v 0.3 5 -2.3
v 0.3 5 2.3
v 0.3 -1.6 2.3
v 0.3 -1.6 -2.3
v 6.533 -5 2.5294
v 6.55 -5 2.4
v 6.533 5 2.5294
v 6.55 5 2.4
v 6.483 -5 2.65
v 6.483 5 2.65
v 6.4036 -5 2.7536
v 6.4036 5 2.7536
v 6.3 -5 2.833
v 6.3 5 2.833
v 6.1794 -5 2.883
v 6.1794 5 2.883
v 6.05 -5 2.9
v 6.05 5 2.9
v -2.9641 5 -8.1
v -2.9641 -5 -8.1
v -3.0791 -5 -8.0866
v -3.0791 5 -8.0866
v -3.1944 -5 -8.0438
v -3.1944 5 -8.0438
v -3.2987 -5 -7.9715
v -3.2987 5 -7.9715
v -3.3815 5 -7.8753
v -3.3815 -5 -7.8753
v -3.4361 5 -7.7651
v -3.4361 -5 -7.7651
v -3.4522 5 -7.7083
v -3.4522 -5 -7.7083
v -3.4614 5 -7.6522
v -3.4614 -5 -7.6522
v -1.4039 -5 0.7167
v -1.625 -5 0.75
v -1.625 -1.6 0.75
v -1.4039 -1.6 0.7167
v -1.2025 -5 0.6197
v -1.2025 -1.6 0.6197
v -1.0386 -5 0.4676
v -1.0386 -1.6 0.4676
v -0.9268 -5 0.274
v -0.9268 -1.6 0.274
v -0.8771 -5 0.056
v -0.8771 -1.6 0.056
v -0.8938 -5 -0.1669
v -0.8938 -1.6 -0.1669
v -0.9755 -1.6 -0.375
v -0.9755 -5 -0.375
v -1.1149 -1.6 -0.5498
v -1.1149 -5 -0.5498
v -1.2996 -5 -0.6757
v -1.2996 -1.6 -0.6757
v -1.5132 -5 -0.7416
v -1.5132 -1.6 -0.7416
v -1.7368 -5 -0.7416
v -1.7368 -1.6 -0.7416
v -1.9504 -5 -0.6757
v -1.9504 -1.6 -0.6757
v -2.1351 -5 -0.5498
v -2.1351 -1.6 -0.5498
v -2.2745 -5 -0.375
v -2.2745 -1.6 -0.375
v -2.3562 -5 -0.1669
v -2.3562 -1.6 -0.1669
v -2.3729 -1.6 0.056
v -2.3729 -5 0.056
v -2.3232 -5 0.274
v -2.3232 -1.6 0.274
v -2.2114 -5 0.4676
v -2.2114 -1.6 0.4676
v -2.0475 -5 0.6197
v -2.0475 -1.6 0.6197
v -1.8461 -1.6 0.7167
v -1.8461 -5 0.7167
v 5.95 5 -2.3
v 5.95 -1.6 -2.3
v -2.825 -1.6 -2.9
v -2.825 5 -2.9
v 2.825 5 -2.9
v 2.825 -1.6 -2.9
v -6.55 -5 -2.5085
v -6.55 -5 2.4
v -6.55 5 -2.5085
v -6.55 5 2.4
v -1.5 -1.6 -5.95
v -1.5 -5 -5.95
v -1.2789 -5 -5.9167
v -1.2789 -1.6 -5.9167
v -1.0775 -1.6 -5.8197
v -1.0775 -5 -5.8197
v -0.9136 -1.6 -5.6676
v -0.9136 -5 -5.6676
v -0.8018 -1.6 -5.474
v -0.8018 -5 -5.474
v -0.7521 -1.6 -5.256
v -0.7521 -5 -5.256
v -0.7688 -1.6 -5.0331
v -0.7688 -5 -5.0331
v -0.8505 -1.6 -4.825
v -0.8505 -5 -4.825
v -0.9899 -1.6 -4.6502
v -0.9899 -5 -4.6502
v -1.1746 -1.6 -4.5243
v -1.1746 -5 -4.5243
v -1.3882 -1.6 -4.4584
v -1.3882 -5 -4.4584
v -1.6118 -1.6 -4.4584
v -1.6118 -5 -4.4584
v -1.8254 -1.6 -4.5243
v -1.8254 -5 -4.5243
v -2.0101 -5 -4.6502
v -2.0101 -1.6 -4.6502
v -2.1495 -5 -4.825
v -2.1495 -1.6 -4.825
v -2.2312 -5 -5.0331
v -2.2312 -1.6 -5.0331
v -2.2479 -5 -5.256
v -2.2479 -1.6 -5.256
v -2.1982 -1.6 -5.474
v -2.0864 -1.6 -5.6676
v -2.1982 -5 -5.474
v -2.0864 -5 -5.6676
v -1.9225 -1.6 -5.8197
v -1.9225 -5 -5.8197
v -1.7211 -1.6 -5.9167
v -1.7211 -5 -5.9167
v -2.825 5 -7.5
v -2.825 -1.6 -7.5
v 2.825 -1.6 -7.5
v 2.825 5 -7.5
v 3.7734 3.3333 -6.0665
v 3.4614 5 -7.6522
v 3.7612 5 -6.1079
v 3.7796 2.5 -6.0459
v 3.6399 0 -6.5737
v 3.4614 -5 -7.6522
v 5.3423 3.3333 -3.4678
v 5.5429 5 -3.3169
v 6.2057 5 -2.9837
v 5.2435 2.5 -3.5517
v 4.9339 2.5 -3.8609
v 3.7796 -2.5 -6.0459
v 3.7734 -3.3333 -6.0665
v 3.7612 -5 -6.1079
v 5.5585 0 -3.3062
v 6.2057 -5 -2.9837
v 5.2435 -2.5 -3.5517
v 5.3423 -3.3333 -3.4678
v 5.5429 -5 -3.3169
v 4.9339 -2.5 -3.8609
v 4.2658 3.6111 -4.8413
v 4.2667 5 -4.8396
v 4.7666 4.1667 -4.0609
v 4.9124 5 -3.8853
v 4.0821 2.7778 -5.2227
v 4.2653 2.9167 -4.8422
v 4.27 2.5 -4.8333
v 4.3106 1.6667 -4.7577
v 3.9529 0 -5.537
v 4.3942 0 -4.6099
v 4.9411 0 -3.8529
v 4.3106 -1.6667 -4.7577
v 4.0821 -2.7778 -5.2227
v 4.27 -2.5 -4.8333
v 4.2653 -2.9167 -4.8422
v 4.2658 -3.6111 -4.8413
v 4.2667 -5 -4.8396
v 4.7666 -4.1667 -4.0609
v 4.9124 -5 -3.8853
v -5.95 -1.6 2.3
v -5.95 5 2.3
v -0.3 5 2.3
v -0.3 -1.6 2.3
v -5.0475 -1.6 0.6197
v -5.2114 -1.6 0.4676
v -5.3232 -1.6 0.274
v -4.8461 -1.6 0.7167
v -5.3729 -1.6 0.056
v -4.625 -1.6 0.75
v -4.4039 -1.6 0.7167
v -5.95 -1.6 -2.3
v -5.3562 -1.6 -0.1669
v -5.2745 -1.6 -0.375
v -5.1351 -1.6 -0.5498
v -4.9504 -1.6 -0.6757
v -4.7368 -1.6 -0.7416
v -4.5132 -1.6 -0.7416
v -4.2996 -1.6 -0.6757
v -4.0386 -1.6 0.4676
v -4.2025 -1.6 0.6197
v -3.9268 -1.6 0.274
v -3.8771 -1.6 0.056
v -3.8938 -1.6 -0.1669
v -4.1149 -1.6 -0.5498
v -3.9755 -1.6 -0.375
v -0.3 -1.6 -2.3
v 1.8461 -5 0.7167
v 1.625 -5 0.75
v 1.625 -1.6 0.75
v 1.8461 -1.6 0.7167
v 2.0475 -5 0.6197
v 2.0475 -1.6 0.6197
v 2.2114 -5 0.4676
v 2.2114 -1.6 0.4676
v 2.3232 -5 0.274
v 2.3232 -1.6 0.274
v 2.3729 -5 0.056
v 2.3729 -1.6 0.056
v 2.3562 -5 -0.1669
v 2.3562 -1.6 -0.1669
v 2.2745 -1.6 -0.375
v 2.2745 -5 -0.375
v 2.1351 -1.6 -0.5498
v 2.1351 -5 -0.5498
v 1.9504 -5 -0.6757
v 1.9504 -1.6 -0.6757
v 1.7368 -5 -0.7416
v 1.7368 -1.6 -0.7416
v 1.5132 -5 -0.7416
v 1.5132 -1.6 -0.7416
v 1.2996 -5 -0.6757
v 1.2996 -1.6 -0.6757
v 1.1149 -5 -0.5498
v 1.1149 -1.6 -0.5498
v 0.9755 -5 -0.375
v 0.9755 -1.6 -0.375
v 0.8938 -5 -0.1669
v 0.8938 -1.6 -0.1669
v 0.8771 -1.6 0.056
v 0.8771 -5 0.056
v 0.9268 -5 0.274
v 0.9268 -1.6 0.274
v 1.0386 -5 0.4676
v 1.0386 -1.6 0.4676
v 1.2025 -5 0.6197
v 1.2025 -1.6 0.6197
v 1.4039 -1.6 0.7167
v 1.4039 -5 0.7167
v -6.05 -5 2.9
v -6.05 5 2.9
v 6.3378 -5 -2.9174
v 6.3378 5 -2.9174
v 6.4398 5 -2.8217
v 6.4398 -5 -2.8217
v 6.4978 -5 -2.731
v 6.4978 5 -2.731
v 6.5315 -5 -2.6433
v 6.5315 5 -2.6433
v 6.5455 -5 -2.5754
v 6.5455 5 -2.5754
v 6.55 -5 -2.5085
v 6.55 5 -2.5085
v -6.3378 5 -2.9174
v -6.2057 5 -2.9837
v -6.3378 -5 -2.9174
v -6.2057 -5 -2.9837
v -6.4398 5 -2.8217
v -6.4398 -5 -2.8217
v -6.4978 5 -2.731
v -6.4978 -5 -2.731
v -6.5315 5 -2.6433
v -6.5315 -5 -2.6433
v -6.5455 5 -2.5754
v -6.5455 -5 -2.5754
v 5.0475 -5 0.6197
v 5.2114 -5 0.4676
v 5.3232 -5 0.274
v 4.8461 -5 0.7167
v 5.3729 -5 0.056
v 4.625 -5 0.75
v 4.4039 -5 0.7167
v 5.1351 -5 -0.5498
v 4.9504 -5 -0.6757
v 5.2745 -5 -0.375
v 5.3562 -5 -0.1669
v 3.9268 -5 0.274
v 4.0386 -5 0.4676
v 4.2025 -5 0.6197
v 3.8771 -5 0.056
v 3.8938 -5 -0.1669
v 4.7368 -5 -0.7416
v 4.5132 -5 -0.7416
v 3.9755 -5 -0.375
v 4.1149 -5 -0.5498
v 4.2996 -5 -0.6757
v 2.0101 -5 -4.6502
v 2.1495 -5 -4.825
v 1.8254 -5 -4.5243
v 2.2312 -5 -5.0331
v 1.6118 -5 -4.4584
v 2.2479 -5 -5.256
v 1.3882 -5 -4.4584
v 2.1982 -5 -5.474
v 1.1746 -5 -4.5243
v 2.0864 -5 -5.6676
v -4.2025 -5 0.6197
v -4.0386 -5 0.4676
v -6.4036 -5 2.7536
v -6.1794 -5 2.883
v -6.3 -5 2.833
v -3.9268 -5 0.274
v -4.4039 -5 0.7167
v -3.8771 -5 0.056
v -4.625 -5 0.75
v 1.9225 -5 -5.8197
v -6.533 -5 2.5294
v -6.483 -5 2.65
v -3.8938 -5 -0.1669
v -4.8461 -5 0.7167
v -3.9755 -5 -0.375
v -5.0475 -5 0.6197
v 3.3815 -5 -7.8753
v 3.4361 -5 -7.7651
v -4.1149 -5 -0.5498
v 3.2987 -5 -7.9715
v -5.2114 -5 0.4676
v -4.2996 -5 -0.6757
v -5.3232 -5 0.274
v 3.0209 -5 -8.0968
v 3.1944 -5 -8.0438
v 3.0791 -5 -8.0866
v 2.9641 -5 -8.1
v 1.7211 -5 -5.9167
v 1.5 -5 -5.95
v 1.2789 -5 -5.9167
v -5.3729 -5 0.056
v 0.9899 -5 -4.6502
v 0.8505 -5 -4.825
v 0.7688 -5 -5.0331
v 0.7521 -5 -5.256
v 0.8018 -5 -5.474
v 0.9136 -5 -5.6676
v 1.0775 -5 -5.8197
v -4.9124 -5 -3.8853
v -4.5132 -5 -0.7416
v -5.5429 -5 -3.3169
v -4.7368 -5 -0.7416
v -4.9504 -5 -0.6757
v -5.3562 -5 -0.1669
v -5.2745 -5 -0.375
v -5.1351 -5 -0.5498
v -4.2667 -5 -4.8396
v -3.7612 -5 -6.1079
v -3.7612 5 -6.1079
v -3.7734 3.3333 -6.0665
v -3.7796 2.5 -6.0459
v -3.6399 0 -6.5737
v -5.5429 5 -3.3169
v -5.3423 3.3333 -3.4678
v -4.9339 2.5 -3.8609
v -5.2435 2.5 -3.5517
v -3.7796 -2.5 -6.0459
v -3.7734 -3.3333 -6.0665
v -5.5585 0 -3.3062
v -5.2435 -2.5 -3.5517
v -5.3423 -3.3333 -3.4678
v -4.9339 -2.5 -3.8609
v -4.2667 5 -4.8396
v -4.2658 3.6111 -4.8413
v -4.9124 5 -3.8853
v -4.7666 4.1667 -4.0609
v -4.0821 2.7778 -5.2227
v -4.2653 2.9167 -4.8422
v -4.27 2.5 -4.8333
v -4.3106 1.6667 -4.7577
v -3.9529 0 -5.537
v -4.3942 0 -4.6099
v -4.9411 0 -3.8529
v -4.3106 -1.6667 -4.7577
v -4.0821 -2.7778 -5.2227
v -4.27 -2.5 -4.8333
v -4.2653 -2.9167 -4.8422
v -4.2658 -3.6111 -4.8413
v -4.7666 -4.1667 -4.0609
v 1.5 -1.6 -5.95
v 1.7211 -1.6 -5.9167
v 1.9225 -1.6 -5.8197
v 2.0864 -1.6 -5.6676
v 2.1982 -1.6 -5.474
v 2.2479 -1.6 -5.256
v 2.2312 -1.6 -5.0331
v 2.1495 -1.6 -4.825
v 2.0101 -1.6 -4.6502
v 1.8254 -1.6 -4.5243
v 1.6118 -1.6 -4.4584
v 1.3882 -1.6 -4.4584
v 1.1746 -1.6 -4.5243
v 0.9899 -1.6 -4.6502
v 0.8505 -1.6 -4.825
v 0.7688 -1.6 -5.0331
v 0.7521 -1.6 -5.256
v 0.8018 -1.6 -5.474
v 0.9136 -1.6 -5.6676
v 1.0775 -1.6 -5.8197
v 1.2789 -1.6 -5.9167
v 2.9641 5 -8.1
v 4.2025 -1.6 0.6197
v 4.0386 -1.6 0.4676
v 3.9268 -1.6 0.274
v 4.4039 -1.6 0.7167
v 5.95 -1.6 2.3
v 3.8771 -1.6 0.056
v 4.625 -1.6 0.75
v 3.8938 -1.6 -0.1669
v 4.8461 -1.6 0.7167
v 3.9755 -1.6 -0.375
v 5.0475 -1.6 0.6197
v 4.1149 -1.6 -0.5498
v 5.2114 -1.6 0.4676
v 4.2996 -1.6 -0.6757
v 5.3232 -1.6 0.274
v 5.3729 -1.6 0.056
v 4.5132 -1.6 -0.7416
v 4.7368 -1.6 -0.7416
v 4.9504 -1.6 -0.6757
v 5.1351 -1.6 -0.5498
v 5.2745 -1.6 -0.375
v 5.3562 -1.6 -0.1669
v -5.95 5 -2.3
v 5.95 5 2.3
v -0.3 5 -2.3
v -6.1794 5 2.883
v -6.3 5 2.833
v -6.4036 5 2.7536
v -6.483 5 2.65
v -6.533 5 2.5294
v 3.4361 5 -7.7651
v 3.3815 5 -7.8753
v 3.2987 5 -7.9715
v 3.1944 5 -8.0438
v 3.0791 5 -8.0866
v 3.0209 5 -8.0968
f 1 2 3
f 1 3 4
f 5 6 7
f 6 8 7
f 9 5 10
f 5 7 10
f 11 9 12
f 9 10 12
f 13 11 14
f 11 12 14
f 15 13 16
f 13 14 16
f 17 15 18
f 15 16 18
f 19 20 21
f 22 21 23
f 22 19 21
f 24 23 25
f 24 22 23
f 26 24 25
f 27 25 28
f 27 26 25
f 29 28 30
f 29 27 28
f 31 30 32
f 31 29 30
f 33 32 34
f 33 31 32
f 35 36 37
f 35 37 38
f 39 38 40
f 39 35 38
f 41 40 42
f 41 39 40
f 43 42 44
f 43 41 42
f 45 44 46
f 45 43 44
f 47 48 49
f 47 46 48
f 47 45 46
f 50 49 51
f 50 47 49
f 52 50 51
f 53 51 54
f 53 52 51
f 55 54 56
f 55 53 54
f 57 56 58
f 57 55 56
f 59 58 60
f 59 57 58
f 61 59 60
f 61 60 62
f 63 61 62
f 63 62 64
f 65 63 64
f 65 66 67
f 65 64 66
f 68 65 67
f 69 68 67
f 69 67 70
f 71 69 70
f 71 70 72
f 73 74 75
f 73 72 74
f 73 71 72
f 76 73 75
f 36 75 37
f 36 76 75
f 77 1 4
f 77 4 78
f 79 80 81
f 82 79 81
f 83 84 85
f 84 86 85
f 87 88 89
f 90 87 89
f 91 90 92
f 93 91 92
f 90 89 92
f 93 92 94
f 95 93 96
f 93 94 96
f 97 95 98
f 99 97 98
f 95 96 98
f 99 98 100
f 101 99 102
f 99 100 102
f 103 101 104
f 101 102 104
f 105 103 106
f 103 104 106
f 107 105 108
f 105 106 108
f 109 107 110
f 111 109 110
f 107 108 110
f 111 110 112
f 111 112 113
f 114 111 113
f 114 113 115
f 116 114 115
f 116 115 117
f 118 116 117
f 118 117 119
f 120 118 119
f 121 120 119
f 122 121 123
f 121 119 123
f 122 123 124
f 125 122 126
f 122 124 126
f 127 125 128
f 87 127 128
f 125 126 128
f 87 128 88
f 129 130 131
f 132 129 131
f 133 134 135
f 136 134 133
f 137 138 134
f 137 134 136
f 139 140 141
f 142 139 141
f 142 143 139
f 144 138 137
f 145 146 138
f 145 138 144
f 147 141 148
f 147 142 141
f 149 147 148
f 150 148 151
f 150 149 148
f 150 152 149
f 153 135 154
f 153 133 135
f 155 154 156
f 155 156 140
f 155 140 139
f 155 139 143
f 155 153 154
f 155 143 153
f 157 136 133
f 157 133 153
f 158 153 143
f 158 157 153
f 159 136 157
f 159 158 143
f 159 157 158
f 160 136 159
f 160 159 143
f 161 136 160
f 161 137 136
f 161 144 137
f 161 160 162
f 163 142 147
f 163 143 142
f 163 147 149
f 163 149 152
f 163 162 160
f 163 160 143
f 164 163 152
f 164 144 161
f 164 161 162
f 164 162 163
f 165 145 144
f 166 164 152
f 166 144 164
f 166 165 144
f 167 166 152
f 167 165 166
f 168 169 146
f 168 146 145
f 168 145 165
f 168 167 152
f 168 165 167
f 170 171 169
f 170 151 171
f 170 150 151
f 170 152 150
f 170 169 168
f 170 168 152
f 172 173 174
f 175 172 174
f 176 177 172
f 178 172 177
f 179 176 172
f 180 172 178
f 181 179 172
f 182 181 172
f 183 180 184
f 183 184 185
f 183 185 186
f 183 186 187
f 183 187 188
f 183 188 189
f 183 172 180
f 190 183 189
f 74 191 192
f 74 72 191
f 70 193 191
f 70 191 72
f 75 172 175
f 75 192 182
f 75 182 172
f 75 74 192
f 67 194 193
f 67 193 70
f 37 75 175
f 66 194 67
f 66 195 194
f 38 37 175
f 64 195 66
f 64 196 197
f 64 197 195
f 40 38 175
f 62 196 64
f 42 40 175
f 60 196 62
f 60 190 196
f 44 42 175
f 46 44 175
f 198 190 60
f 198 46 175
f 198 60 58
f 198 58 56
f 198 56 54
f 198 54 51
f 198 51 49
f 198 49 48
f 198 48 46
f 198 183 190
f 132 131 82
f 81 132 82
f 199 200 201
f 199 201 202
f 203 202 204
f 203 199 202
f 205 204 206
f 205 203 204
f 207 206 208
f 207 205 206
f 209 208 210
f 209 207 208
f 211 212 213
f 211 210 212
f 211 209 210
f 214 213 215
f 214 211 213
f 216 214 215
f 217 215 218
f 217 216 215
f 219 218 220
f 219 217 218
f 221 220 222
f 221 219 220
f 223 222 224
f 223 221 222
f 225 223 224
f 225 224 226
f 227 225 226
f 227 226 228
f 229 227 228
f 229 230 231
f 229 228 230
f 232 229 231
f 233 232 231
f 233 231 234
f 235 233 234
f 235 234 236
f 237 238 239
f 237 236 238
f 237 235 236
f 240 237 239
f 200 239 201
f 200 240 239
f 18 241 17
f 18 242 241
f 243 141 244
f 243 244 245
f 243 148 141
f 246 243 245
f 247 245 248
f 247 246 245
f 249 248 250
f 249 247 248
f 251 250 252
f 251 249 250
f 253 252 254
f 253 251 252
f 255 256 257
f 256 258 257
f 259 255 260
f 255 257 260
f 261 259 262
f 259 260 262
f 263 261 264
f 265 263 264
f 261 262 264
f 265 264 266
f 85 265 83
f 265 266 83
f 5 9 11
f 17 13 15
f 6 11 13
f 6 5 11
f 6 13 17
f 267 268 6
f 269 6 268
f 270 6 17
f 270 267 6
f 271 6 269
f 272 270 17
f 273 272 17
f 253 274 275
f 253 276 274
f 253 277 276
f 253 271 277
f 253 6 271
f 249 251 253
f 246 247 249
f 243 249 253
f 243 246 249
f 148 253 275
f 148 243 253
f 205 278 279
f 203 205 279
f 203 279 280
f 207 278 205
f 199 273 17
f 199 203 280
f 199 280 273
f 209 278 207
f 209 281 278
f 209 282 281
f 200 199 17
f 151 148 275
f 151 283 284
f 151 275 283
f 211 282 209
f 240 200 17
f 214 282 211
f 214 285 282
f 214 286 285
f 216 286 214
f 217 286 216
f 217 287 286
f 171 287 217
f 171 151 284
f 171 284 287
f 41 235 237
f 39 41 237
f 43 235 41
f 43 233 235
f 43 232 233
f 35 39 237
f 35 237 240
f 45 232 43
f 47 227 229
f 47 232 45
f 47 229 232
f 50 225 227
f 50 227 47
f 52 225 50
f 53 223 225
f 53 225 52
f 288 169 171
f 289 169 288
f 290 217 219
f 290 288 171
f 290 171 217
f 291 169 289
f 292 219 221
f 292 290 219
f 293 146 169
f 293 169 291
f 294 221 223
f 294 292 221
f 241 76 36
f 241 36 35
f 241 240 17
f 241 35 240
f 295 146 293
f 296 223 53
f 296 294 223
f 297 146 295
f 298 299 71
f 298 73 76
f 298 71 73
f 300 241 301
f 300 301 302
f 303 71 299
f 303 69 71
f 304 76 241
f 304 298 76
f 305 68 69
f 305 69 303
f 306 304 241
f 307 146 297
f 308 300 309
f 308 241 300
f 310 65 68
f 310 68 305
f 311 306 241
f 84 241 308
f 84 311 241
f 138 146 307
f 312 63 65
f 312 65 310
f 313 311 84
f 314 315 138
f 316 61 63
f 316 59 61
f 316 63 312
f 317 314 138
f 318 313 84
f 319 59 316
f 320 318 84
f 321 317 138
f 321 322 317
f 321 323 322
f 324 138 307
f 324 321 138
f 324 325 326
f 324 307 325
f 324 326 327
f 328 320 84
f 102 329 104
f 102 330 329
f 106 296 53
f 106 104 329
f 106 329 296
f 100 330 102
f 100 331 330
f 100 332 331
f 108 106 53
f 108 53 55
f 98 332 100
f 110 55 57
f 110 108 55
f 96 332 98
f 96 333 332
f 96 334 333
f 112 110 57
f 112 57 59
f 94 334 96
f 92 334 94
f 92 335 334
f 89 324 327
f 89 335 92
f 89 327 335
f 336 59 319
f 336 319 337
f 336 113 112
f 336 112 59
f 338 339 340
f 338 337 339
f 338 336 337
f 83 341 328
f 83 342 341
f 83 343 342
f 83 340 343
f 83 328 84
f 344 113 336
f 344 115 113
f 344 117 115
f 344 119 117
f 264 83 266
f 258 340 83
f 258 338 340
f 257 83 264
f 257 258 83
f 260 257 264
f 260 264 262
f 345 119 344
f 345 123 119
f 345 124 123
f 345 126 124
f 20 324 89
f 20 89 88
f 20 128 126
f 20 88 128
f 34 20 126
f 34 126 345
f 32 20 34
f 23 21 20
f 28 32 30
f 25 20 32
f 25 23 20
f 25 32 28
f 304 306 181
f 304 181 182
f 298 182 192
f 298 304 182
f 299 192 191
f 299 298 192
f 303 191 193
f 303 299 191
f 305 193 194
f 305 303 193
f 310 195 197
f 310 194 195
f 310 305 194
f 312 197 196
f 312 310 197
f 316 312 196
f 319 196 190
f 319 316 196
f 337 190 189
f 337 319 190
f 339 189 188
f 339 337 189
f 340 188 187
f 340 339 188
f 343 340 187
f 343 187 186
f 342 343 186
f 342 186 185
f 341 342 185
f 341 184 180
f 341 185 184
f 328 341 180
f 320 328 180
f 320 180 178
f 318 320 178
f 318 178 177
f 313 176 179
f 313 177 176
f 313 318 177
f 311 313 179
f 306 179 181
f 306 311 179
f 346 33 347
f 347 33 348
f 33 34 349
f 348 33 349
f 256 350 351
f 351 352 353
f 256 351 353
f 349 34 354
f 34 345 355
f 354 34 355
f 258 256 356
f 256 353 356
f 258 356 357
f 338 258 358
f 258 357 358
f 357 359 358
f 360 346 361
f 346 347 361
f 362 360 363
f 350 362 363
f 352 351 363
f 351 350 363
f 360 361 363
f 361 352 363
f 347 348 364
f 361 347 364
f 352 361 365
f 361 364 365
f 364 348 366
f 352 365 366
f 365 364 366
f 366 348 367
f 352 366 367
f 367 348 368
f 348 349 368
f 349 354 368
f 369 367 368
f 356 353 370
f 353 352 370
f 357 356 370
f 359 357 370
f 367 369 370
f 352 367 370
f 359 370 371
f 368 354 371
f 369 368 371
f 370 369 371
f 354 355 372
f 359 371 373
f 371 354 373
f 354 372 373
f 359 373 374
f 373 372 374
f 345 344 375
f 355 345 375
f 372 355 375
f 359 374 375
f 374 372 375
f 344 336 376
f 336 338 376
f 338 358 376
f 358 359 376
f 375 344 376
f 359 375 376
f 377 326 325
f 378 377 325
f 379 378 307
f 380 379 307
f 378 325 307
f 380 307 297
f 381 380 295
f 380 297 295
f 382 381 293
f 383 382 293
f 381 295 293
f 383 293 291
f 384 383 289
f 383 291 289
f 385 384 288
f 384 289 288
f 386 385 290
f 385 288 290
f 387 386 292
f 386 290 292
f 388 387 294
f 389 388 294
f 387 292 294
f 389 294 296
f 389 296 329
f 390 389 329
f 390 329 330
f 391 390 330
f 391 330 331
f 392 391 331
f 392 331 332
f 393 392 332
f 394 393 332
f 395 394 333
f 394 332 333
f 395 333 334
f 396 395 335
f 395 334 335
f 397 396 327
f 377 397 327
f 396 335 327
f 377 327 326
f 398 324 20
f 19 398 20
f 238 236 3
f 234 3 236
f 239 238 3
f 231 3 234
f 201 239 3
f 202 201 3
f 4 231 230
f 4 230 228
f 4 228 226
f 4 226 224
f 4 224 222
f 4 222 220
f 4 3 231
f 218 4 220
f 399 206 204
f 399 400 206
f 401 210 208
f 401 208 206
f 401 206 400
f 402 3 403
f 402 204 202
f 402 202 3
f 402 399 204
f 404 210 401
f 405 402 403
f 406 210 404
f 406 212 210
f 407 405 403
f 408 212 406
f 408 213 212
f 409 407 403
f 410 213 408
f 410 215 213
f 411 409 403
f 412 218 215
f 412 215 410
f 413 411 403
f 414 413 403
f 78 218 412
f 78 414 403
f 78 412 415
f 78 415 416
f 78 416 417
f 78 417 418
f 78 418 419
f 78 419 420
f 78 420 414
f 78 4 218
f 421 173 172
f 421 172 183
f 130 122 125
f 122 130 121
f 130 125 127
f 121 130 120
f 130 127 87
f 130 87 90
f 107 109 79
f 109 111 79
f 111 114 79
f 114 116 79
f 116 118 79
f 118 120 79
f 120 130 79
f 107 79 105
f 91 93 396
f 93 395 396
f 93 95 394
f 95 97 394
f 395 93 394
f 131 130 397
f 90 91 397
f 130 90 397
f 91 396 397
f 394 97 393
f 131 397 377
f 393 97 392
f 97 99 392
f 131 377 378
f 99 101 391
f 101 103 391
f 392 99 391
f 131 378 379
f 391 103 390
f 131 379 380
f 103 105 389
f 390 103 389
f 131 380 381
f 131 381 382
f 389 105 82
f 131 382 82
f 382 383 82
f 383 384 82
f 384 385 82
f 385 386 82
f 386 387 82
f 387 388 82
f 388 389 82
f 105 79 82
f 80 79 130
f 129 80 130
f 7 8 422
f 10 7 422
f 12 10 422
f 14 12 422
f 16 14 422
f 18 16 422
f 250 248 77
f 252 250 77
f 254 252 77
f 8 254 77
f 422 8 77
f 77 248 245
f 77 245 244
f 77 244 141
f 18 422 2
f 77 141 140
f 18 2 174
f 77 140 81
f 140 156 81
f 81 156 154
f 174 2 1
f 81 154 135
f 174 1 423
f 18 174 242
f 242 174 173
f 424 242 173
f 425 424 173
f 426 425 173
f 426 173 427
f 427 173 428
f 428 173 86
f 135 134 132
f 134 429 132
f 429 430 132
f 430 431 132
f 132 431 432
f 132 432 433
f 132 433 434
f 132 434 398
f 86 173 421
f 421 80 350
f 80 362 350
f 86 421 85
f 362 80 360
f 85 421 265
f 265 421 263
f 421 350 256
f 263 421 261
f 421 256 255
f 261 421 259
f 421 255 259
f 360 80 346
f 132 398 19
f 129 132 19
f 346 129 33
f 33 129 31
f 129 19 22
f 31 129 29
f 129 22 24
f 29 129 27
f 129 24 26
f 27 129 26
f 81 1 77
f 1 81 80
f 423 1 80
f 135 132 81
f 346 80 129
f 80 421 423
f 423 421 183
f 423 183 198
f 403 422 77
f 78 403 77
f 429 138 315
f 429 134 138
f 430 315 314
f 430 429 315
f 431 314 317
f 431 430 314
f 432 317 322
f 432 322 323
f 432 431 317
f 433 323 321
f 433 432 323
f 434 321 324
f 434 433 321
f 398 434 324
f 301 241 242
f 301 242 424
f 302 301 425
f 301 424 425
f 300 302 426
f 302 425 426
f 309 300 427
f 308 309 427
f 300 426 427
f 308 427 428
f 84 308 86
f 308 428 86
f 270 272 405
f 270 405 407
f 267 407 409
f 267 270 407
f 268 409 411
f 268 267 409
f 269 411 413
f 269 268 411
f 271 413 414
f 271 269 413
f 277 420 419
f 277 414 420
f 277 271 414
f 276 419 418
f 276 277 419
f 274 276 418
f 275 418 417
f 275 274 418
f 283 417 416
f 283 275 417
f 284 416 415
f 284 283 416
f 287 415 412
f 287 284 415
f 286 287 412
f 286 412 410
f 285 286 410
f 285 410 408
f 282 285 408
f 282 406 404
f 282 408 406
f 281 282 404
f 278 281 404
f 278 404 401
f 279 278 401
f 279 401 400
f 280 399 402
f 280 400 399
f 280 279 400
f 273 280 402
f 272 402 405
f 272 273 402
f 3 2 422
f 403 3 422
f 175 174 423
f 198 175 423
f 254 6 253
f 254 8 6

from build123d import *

# Parameters (mm, degrees)
SKETCH1_W               = 13.1
SKETCH1_H               = 5.8
BOSS_EXTRUDE1_DEPTH     = 5
SKETCH10_W              = 5.65
SKETCH10_H              = 4.6
CUT_EXTRUDE7_DEPTH      = 6.6
CUT_EXTRUDE6_DEPTH      = 9.735702605
CUT_EXTRUDE6_DEPTH_BACK = 9.735702605
SKETCH9_R               = 0.75
BOSS_EXTRUDE2_START     = -5
BOSS_EXTRUDE2_DEPTH     = 10
SKETCH12_W              = 5.65
SKETCH12_H              = 4.6
SKETCH12_R              = 0.75
BOSS_EXTRUDE3_DEPTH     = 3.4
FILLET1_START           = -5
FILLET1_DEPTH           = 10
FILLET2_R               = 0.5


with BuildPart() as part:
    # Sketch1 → Boss-Extrude1 (new, symmetric)
    with BuildSketch(Plane(origin=(0, 0, 0), x_dir=(1, 0, 0), z_dir=(0, 1, 0))):
        Rectangle(SKETCH1_W, SKETCH1_H)
    extrude(amount=BOSS_EXTRUDE1_DEPTH, both=True)

    # Sketch10 → Cut-Extrude7 (cut)
    with BuildSketch(Plane(origin=(0, 5, 0), x_dir=(1, 0, 0), z_dir=(0, 1, 0))):
        with Locations((-3.125, 0)):
            Rectangle(SKETCH10_W, SKETCH10_H)
        with Locations((3.125, 0)):
            Rectangle(SKETCH10_W, SKETCH10_H)
    extrude(amount=-CUT_EXTRUDE7_DEPTH, mode=Mode.SUBTRACT)

    # Sketch9 → Cut-Extrude6 (cut, two sides: drawn at the far end of the back side and taken through both)
    with BuildSketch(Plane(origin=(0, 0, 0), x_dir=(1, 0, 0), z_dir=(0, 1, 0)).offset(-CUT_EXTRUDE6_DEPTH_BACK)):
        with Locations(Location((-4.625, 0, 0), (0, 0, 270))):
            Circle(SKETCH9_R)
        with Locations(Location((-1.625, 0, 0), (0, 0, 270))):
            Circle(SKETCH9_R)
        with Locations(Location((1.625, 0, 0), (0, 0, 270))):
            Circle(SKETCH9_R)
        with Locations(Location((4.625, 0, 0), (0, 0, 270))):
            Circle(SKETCH9_R)
    extrude(amount=CUT_EXTRUDE6_DEPTH + CUT_EXTRUDE6_DEPTH_BACK, mode=Mode.SUBTRACT)

    # Sketch11 → Boss-Extrude2 (add)
    with BuildSketch(Plane(origin=(0, 0, 0), x_dir=(1, 0, 0), z_dir=(0, 1, 0)).offset(BOSS_EXTRUDE2_START)):
        Polygon((-3.425, 8.1), (-3.425, 2.9), (-2.825, 2.9), (-2.825, 7.5), (2.825, 7.5), (2.825, 2.9), (3.425, 2.9), (3.425, 8.1), align=None)
    extrude(amount=BOSS_EXTRUDE2_DEPTH)

    # Sketch12 → Boss-Extrude3 (add)
    with BuildSketch(Plane.XZ.offset(5)):
        with Locations((0, -5.2)):
            Rectangle(SKETCH12_W, SKETCH12_H)
        with Locations(Location((-1.5, -5.2, 0), (0, 0, 270))):
            Circle(SKETCH12_R, mode=Mode.SUBTRACT)
        with Locations(Location((1.5, -5.2, 0), (0, 0, 270))):
            Circle(SKETCH12_R, mode=Mode.SUBTRACT)
    extrude(amount=-BOSS_EXTRUDE3_DEPTH)

    # Fillet1: read off the stored shape, not the designer's step
    # Fillet1 outline → Fillet1 (add)
    with BuildSketch(Plane(origin=(0, 0, 0), x_dir=(1, 0, 0), z_dir=(0, 1, 0)).offset(FILLET1_START)):
        with BuildLine():
            add(Edge.make_bspline(
                [(3.425, 8.1), (3.699466412, 3.355749046), (6.55, 2.9)],
                knots=[0, 0, 0, 1, 1, 1], degree=2, weights=[1, 0.779308952, 1]))
            Line((3.425, 8.1), (3.425, 2.9))
            Line((3.425, 2.9), (6.55, 2.9))
        make_face()
        with BuildLine():
            Line((-3.425, 2.9), (-3.425, 8.1))
            add(Edge.make_bspline(
                [(-3.425, 8.1), (-3.699466412, 3.355749046), (-6.55, 2.9)],
                knots=[0, 0, 0, 1, 1, 1], degree=2, weights=[1, 0.779308952, 1]))
            Line((-6.55, 2.9), (-3.425, 2.9))
        make_face()
    extrude(amount=FILLET1_DEPTH)

    # Fillet2
    fillet2_edges = [part.edges().sort_by_distance(p)[0] for p in [
        (-6.55, 0, -2.9),
        (-3.425, 0, -8.1),
        (3.425, 0, -8.1),
        (6.55, 0, -2.9),
        (6.55, 0, 2.9),
        (-6.55, 0, 2.9),
    ]]
    fillet(fillet2_edges, radius=FILLET2_R)


solid = part.part
